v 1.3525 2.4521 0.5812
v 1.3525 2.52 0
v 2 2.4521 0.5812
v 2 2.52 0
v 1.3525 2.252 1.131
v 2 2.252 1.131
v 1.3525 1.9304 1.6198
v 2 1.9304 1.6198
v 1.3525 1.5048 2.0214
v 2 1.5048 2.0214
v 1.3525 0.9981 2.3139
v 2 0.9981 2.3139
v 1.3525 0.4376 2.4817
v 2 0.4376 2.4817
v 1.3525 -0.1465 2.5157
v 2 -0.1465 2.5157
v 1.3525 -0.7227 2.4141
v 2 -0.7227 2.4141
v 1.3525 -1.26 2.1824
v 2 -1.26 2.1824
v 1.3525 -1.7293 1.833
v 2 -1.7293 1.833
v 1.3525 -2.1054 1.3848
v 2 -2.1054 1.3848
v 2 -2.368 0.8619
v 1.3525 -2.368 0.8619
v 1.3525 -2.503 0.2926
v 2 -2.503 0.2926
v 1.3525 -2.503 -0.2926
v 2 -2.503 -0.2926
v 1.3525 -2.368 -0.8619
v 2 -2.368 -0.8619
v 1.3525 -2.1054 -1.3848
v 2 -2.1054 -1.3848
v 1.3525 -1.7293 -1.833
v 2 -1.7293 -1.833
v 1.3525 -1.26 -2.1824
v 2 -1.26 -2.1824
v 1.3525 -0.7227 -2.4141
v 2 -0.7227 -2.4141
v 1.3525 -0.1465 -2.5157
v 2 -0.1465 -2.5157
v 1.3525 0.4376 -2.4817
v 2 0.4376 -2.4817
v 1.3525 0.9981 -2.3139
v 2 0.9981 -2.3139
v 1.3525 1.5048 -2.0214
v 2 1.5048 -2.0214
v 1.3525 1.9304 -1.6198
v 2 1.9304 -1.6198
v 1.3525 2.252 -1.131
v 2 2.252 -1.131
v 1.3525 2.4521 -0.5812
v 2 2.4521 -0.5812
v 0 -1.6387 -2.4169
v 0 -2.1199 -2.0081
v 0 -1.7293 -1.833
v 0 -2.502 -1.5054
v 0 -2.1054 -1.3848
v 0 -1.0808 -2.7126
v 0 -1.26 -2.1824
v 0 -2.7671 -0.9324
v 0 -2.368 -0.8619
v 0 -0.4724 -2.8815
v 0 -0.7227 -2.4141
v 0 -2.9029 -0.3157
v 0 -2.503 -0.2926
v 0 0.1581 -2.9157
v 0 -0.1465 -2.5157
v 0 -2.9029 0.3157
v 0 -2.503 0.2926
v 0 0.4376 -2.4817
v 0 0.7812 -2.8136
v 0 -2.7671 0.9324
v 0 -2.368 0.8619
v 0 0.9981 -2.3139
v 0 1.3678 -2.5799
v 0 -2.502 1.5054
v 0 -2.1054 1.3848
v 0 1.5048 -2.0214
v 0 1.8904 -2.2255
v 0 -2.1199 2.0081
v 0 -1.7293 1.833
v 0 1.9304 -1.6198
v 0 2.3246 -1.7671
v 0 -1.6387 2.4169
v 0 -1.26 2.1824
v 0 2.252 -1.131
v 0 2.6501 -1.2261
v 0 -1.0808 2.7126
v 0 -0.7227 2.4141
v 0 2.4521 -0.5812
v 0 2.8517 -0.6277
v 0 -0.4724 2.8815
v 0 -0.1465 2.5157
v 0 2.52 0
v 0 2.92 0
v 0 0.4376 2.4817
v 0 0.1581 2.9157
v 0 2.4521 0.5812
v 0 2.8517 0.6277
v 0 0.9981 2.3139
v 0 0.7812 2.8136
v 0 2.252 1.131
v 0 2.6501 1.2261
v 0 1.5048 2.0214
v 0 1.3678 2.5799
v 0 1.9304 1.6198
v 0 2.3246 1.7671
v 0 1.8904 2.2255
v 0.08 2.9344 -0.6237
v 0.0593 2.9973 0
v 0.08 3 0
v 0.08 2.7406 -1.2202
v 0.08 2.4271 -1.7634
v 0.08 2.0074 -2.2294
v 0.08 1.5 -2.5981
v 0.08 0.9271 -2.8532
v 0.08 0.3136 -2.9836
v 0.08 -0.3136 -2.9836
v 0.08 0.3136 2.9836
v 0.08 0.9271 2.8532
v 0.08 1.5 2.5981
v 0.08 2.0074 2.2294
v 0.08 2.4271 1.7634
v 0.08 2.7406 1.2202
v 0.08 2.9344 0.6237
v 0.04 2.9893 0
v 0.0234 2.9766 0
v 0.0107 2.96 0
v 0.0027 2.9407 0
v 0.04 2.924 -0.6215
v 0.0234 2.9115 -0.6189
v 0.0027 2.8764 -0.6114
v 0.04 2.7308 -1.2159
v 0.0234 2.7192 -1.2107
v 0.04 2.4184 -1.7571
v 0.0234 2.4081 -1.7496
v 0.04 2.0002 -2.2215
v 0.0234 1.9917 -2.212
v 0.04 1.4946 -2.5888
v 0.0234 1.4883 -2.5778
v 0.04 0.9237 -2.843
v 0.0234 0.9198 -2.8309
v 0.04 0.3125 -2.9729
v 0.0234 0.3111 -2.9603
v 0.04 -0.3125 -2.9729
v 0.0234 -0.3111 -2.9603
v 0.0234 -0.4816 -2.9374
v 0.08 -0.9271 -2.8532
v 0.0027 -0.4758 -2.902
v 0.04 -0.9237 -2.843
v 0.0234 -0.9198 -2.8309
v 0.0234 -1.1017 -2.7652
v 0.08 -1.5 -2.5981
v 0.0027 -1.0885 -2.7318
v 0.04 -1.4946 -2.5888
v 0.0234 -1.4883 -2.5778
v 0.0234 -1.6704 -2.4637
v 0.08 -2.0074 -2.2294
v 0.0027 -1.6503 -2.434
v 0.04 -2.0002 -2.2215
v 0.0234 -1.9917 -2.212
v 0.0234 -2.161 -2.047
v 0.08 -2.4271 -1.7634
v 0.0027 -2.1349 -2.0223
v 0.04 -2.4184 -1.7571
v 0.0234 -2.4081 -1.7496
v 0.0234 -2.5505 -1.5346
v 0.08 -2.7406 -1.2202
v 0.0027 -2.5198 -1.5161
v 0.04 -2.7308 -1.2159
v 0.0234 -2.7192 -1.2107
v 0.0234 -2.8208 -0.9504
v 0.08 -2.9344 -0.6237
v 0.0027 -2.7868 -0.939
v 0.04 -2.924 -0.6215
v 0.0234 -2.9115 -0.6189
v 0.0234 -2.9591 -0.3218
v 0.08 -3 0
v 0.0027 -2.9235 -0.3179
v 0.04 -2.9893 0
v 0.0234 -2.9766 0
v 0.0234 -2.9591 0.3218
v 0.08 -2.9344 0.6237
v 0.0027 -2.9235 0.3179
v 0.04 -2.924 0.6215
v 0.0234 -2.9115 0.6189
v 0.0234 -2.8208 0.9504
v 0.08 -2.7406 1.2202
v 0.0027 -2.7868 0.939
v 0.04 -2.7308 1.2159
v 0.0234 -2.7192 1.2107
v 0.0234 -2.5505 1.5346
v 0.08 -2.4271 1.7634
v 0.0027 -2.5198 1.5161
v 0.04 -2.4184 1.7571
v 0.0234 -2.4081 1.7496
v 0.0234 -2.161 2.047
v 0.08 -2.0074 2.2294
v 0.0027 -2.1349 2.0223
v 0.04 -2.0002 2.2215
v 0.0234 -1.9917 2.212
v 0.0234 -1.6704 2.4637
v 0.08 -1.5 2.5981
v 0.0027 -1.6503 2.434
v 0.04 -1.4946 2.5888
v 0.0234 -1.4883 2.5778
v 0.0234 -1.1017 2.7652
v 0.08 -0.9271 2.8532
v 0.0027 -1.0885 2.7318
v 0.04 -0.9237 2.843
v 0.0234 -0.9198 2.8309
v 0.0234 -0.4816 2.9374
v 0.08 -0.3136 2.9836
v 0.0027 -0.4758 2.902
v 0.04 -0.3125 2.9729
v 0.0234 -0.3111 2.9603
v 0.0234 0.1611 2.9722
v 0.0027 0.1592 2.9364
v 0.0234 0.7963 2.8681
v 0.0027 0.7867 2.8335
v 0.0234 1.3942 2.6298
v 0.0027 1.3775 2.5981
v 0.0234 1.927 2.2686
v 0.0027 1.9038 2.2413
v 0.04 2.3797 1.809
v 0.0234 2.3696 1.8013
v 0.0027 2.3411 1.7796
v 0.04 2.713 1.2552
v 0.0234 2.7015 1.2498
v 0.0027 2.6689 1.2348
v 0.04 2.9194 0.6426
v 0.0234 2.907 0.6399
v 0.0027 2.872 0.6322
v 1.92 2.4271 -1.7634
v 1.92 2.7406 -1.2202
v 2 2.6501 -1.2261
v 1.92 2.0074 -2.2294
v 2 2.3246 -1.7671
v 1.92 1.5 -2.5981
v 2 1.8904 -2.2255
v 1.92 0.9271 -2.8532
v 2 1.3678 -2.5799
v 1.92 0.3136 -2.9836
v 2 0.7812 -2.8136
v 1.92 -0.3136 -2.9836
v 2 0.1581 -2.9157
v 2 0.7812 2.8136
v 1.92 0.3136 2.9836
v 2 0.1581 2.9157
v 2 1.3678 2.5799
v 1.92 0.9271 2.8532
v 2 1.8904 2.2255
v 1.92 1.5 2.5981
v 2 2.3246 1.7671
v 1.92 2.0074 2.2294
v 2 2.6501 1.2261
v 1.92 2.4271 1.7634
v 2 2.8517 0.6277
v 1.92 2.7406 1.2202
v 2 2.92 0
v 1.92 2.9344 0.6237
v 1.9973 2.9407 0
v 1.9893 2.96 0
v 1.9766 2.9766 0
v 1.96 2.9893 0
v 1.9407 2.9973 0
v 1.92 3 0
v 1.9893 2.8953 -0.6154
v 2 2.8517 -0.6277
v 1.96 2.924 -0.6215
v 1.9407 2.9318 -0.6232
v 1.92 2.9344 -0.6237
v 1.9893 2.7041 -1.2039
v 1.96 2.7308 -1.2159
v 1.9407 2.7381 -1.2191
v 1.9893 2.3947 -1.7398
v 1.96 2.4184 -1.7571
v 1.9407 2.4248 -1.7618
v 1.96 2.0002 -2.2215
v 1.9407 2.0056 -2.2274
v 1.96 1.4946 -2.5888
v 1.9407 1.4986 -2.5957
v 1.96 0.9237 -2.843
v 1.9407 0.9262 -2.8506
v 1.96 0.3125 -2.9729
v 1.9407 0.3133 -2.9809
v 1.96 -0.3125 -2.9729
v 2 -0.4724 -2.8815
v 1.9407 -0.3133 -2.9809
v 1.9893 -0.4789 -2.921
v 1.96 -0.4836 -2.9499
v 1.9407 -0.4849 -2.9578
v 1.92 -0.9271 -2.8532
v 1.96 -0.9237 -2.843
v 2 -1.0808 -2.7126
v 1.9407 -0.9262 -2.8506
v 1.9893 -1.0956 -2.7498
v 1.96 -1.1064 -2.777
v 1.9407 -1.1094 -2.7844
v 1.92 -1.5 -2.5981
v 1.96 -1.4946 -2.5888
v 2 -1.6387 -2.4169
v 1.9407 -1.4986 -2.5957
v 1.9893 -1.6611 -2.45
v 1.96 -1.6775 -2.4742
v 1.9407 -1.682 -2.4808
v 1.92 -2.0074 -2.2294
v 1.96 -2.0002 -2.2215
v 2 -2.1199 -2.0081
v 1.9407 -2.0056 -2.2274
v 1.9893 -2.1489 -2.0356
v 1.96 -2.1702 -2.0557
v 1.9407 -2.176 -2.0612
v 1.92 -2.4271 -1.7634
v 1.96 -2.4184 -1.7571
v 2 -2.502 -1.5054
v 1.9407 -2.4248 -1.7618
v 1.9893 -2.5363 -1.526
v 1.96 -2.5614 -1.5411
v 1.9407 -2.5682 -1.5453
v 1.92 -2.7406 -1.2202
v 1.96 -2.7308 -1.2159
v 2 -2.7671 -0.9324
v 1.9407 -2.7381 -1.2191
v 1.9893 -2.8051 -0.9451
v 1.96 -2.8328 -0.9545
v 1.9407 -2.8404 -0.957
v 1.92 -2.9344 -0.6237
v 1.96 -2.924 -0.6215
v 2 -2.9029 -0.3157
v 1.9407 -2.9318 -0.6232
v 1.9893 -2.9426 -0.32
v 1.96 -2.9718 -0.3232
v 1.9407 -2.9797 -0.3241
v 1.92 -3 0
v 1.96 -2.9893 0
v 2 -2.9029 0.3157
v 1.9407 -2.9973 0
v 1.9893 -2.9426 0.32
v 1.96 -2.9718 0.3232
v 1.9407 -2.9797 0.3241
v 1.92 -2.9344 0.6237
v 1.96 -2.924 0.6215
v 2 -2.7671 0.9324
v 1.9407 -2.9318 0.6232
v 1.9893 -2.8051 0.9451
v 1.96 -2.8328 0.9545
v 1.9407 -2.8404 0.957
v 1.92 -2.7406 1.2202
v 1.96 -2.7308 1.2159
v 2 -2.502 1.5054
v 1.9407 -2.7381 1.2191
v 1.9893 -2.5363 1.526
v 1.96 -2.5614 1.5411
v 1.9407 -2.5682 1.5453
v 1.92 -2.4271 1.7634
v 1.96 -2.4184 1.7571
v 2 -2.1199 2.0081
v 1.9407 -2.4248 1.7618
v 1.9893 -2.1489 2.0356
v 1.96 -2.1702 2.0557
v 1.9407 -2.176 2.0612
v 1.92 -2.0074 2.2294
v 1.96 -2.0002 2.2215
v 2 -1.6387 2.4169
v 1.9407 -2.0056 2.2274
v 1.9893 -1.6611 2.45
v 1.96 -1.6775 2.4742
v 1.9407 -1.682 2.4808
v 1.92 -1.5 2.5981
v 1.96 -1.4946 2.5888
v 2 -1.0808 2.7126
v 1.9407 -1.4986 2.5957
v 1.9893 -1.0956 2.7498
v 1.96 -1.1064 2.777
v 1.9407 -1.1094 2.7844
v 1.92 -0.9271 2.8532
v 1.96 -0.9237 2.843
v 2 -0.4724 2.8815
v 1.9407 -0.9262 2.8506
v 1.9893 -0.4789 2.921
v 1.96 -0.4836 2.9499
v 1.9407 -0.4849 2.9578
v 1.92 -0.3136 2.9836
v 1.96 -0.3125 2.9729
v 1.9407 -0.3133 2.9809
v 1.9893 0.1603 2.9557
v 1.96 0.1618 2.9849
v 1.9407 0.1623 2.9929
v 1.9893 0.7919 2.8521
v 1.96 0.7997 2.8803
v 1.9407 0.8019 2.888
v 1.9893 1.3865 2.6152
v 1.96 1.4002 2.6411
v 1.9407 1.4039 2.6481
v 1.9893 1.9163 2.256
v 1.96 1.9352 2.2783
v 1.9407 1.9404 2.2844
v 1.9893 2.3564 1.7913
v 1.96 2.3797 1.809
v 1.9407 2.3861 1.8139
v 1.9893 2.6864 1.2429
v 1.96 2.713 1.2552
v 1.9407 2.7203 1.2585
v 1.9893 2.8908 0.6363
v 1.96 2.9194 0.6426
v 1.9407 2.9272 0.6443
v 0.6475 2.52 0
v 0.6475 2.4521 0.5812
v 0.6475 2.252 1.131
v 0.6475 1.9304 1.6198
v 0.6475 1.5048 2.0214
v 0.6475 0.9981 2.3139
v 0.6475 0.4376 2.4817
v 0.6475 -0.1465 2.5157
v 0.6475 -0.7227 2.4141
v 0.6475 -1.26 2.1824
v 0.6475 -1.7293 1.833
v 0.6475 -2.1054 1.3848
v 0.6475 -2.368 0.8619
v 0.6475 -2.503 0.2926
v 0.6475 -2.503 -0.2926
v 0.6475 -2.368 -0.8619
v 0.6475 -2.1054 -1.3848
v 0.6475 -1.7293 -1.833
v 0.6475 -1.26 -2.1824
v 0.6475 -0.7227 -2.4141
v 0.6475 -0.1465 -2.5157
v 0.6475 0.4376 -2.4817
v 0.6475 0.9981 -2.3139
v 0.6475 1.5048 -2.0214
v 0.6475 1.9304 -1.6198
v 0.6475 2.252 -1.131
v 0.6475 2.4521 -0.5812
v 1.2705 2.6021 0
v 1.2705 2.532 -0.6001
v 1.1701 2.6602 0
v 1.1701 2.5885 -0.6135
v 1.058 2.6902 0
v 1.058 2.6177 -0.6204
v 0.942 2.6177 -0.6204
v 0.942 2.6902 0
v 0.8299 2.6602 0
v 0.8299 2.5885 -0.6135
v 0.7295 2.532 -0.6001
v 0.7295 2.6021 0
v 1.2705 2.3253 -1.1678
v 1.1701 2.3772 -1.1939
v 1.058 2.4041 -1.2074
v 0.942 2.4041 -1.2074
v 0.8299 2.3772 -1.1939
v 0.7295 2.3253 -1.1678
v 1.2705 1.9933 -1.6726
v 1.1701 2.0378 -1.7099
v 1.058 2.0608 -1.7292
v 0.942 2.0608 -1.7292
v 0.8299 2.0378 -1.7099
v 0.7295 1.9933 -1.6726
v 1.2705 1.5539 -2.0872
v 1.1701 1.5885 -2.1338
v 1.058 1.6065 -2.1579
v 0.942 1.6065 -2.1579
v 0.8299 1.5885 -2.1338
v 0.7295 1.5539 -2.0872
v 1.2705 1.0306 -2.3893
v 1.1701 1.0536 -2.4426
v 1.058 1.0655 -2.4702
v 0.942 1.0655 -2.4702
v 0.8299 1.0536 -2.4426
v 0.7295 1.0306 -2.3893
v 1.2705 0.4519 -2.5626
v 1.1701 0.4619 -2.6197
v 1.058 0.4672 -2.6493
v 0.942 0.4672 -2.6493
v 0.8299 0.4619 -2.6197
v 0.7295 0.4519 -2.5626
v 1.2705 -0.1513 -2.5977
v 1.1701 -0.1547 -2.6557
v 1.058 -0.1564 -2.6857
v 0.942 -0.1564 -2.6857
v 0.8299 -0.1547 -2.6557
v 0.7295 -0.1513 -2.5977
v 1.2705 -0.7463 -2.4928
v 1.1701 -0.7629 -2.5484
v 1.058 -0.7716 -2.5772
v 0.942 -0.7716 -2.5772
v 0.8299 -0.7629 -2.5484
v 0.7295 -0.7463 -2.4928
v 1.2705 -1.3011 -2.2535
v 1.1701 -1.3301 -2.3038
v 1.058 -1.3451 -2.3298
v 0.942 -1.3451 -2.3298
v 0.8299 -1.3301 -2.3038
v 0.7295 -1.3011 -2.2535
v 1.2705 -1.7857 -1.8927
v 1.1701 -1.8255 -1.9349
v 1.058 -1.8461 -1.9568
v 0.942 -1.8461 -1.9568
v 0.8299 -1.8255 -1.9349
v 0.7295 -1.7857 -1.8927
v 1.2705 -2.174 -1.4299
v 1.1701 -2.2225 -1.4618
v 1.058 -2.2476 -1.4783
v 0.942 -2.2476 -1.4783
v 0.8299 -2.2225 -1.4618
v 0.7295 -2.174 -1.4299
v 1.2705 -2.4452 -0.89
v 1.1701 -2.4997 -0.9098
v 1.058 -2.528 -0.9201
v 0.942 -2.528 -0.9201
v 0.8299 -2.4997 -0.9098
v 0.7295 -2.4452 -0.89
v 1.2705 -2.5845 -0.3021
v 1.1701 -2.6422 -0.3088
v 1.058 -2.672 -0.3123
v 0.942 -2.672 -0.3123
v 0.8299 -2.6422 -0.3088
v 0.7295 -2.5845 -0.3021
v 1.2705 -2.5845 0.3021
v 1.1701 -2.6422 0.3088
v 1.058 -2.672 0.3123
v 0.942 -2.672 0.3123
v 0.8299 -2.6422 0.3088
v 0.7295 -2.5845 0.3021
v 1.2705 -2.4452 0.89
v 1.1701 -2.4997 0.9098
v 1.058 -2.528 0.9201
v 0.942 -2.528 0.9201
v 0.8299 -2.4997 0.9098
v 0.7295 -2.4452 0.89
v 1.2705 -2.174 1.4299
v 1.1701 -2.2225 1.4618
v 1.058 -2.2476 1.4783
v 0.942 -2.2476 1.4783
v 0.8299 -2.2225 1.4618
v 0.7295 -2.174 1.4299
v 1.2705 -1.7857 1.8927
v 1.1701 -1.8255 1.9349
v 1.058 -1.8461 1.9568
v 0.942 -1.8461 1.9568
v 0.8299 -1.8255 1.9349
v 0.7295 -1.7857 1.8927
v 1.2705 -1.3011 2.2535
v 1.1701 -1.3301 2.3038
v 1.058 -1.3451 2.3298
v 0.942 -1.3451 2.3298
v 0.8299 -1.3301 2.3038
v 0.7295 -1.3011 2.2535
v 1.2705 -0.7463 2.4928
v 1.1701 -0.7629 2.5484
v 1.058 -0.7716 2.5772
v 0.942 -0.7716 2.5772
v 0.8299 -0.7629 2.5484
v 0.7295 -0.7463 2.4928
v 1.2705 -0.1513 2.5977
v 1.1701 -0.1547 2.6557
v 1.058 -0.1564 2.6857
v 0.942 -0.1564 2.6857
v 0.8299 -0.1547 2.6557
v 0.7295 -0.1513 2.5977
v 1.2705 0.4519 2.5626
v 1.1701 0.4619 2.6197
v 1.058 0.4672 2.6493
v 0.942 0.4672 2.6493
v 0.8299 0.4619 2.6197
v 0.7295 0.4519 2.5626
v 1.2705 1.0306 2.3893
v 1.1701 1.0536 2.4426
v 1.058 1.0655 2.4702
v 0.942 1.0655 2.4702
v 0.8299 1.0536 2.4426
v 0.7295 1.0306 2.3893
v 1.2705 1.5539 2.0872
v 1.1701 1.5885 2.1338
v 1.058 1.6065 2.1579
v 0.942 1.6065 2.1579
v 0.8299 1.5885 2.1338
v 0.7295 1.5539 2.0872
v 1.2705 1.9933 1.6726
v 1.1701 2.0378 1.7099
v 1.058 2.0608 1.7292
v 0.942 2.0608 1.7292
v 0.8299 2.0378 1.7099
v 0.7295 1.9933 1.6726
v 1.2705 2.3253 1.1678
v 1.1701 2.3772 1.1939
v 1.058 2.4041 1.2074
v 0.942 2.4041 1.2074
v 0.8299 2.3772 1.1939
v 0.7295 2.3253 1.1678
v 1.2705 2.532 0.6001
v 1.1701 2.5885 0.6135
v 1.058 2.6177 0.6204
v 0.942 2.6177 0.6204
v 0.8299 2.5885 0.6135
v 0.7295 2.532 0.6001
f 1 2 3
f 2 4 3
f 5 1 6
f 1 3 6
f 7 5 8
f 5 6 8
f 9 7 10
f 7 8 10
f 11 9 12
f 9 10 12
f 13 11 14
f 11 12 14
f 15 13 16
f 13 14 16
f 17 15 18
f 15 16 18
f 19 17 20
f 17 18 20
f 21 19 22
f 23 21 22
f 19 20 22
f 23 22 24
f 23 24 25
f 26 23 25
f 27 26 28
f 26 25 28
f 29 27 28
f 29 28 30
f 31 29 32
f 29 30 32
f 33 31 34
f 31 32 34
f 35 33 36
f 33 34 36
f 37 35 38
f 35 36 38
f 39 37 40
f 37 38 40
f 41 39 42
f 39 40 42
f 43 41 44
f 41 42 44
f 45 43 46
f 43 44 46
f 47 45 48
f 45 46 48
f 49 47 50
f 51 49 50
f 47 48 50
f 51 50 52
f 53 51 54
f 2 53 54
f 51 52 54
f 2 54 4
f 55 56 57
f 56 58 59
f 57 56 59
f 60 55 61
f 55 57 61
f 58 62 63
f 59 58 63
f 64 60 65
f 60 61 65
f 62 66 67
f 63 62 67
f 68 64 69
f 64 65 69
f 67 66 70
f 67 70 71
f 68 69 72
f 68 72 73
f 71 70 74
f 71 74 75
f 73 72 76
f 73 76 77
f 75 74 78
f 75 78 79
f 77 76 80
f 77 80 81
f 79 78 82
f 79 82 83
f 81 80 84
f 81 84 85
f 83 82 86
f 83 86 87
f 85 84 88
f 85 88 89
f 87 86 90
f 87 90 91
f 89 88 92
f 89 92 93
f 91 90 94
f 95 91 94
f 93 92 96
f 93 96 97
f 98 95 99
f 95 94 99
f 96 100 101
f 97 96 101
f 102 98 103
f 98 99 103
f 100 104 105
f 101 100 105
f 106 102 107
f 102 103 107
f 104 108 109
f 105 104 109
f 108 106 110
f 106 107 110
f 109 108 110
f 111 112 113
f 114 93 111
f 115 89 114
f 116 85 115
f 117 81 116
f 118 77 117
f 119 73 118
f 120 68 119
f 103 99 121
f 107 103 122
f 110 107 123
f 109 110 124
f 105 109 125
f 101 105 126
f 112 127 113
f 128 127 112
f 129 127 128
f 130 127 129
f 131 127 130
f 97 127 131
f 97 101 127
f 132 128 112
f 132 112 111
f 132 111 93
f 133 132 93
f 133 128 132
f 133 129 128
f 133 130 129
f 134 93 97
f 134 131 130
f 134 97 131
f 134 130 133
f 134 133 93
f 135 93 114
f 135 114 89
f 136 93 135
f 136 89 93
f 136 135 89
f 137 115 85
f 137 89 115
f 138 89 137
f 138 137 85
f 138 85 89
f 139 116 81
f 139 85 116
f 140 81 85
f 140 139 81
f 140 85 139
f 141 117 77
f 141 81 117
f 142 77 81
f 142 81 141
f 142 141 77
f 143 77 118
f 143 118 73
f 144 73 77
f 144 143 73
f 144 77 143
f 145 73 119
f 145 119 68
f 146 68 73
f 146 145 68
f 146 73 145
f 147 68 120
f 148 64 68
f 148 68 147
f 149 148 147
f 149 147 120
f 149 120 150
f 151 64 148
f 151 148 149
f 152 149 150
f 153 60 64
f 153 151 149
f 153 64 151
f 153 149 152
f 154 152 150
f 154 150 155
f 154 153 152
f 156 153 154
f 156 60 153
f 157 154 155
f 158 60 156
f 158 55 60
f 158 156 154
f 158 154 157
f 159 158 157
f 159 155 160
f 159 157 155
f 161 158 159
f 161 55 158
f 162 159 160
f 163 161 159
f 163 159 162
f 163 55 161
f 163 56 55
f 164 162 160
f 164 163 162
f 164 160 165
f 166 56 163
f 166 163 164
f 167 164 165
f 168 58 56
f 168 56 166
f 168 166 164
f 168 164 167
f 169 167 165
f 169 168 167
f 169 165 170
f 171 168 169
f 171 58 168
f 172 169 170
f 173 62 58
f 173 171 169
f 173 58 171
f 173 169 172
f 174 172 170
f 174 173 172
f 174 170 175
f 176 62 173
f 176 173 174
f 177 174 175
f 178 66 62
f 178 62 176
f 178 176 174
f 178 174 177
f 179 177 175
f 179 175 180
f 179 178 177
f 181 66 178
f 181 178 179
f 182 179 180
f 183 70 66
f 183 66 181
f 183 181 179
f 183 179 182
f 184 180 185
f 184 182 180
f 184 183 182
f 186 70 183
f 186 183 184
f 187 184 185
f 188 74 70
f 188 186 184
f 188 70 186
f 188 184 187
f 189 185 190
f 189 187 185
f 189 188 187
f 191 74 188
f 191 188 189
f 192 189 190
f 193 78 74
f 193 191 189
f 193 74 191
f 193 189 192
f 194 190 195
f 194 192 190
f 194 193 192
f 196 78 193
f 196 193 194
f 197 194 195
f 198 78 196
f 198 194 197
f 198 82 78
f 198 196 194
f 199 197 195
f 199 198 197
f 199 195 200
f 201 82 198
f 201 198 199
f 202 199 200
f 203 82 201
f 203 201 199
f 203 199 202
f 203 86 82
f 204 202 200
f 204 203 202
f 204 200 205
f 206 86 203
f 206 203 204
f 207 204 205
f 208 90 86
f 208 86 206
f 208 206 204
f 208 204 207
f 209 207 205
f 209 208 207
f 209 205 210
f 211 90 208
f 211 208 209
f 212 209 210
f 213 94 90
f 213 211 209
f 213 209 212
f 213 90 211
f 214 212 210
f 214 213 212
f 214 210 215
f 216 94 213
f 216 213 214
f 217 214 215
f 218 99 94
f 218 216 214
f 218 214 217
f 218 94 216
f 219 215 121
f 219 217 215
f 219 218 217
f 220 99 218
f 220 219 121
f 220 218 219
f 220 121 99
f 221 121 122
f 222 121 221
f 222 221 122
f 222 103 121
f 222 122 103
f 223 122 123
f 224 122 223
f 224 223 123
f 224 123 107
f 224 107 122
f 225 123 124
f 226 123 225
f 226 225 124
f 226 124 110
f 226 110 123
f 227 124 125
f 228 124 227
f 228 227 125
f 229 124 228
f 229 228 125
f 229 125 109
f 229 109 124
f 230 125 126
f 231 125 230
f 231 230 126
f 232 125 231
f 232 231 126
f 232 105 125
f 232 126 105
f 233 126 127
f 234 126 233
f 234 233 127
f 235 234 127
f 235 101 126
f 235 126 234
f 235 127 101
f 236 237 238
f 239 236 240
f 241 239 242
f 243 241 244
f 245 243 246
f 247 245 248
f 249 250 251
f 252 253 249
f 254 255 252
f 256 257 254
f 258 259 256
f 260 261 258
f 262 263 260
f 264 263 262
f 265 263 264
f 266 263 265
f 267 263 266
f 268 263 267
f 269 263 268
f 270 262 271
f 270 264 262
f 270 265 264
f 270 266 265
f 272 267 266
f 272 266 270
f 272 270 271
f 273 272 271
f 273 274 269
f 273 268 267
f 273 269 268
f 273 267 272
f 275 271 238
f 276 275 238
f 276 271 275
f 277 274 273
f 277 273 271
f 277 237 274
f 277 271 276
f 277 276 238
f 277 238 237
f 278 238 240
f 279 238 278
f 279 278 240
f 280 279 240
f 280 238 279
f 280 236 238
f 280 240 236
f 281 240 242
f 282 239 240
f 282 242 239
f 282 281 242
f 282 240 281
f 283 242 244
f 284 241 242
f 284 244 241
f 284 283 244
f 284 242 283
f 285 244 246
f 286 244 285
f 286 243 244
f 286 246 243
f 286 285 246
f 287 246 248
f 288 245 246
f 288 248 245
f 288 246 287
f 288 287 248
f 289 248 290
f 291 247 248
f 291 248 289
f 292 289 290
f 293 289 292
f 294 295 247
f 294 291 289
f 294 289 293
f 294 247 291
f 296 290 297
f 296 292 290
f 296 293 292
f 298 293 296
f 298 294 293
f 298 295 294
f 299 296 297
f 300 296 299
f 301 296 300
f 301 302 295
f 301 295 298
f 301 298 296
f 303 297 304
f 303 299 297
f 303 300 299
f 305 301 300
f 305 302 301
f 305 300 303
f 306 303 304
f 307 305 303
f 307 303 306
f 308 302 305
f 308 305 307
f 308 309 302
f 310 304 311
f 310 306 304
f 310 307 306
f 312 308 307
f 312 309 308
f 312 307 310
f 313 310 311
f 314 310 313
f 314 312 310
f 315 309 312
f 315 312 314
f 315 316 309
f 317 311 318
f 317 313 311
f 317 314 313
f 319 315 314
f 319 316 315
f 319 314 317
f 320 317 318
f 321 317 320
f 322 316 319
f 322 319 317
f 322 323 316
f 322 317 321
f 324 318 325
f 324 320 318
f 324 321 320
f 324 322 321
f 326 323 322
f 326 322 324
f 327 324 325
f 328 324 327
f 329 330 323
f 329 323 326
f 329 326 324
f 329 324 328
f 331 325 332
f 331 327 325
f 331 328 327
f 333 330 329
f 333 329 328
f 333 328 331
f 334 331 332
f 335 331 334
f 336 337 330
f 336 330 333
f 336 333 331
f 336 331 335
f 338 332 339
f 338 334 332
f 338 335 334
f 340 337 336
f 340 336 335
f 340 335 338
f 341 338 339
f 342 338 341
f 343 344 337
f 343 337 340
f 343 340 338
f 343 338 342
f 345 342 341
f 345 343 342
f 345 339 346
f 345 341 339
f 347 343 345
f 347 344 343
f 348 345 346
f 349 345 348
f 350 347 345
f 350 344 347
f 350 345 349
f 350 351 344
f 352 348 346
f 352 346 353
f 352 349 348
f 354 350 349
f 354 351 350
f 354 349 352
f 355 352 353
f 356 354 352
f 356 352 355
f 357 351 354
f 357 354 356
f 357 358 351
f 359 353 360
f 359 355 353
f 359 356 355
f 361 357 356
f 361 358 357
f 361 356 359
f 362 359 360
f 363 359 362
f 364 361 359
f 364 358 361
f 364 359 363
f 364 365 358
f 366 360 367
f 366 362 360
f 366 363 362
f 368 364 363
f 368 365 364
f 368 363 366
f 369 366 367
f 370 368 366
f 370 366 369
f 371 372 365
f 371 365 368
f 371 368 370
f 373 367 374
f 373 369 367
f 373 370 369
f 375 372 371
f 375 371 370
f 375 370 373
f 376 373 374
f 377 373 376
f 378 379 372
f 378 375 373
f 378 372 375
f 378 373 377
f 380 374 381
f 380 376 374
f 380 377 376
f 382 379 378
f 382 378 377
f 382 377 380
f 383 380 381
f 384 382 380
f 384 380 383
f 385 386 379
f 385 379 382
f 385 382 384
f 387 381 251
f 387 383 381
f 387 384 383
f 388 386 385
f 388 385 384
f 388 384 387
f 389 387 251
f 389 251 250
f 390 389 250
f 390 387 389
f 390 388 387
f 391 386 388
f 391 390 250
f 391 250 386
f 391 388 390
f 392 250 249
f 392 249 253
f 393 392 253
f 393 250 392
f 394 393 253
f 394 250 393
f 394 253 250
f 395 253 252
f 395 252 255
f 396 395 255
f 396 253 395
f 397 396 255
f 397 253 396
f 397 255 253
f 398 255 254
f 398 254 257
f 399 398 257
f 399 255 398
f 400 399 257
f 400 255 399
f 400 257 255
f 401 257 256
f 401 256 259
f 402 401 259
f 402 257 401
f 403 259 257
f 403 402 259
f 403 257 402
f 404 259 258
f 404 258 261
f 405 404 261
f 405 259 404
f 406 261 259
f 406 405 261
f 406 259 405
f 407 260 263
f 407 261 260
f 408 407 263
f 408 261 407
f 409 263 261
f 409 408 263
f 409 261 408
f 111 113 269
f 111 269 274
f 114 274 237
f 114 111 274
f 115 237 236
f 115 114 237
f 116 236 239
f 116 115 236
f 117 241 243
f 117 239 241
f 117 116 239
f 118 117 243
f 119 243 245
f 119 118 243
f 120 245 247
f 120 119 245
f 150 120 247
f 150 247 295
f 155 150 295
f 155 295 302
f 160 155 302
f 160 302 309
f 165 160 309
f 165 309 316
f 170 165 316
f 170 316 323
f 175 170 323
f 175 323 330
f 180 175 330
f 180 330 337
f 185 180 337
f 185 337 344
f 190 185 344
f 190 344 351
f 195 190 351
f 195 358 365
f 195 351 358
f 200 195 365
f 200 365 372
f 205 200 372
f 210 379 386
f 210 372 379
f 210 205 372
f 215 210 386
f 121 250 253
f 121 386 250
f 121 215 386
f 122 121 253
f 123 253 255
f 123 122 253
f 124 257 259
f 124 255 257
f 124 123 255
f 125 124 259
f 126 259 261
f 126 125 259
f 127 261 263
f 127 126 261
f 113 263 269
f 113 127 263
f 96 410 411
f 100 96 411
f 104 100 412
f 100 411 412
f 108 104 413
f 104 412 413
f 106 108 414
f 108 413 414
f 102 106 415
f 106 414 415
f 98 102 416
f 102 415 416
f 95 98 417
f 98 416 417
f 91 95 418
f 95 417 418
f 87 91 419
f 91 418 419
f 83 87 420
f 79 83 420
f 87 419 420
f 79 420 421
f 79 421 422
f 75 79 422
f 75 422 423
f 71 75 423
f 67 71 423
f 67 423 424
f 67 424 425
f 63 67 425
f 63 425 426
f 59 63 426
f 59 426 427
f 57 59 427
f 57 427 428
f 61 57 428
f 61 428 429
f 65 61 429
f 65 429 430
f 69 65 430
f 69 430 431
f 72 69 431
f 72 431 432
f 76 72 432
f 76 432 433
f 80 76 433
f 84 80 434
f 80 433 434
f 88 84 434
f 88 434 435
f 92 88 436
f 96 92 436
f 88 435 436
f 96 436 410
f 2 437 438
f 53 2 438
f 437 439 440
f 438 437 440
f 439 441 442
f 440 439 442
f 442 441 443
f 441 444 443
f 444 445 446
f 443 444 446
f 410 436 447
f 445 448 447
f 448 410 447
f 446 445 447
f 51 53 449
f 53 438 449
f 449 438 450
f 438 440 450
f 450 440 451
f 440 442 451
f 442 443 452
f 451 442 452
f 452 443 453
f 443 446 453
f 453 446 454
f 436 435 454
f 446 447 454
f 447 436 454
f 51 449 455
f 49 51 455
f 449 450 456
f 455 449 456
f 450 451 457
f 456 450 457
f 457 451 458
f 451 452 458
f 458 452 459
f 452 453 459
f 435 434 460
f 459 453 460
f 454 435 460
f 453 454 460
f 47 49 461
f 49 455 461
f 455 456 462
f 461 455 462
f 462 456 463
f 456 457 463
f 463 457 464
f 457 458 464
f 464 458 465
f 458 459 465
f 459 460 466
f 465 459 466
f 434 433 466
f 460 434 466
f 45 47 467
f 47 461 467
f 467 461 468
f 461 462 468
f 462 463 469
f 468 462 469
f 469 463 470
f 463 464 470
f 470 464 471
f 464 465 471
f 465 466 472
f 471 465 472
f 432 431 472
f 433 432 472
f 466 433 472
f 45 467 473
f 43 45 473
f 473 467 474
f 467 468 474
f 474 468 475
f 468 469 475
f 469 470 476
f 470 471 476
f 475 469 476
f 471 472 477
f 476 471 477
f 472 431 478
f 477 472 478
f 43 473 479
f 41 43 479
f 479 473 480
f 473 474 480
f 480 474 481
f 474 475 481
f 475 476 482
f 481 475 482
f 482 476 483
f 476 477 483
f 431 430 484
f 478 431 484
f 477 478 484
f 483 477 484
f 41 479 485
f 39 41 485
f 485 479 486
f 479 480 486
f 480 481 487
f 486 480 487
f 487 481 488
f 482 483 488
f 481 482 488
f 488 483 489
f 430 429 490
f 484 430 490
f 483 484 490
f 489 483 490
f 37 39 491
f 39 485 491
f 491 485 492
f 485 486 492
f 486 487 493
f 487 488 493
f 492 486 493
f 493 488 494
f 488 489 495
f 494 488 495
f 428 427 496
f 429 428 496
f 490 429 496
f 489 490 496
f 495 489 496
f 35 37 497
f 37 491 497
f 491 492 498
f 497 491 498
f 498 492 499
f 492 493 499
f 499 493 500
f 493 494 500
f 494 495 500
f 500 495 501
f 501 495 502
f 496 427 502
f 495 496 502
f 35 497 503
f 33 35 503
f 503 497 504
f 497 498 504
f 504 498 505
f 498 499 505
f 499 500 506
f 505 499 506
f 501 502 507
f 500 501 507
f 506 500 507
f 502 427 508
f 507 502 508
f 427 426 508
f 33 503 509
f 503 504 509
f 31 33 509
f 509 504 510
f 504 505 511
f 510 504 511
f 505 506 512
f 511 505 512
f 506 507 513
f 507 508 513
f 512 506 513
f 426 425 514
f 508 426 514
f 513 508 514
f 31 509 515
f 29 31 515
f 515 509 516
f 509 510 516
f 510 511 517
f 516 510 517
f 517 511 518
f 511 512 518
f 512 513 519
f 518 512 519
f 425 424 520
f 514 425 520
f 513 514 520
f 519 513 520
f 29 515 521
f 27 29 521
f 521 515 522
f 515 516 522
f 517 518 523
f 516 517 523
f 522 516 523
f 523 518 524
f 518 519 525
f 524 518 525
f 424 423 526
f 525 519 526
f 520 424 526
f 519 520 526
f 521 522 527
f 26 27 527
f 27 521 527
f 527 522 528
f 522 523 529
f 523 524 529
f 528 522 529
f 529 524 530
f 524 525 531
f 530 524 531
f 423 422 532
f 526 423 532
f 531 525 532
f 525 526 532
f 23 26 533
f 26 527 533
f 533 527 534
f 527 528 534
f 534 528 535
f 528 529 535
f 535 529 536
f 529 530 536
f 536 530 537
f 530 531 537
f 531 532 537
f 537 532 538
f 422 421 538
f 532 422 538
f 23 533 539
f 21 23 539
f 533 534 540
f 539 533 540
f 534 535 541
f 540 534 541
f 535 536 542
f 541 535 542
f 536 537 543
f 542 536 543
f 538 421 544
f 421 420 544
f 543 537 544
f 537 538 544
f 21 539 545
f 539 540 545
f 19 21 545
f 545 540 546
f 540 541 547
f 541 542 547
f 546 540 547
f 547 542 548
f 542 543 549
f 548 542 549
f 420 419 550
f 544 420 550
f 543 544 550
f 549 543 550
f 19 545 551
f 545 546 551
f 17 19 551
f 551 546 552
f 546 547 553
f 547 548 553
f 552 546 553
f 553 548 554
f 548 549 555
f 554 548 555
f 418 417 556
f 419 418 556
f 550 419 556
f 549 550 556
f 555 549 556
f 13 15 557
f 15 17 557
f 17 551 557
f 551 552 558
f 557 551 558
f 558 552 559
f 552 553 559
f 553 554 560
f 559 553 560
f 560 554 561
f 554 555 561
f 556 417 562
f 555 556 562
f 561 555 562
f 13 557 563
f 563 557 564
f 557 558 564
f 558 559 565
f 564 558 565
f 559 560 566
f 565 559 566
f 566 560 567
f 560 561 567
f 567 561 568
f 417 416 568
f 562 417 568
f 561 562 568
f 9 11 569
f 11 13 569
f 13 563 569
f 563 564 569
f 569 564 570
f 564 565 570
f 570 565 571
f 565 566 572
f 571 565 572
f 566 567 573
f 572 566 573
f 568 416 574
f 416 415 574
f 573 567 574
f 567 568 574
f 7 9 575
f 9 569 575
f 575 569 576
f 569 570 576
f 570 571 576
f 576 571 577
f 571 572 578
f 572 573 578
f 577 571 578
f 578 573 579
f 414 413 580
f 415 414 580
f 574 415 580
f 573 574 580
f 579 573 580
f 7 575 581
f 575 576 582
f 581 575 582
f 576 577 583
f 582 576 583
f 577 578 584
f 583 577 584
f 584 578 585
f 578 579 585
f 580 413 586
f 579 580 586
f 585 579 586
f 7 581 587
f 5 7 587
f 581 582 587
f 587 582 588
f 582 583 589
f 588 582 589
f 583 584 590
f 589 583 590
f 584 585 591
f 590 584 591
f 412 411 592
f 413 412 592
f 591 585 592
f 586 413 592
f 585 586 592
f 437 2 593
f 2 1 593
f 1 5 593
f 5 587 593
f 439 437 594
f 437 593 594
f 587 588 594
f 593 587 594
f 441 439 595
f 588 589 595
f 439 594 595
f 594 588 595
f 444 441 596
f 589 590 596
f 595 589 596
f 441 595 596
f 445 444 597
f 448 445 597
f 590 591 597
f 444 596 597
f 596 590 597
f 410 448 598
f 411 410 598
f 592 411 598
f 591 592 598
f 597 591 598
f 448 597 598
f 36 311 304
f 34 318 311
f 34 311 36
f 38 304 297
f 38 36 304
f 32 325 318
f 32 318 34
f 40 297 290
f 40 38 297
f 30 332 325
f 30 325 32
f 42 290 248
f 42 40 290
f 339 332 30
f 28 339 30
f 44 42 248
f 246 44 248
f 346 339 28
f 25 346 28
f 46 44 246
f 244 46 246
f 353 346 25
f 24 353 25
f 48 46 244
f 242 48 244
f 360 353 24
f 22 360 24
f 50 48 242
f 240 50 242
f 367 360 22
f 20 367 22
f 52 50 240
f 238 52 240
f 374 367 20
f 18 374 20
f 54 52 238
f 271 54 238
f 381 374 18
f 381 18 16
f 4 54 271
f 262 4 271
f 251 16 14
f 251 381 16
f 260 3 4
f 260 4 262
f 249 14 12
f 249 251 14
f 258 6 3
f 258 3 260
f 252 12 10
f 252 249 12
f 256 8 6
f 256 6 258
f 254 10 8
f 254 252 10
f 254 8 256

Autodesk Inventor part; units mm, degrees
sketch "Sketch_1" plane through (0, 0, 0) normal (0, 0, 1) x (1, 0, 0)
  line L0 (2, 0) -> (0, 0)
  line L1 (0, 2.92) -> (0, 2.52)
  line L2 (0, 2.52) -> (0.6475, 2.52)
  arc A0 (1.3525, 2.52) -> (0.6475, 2.52) centre (1, 2.25) ccw
  line L3 (1.3525, 2.52) -> (2, 2.52)
  line L4 (2, 2.52) -> (2, 2.92)
  arc A1 (2, 2.92) -> (1.92, 3) centre (1.92, 2.92) ccw
  line L5 (1.92, 3) -> (0.08, 3)
  arc A2 (0.08, 3) -> (0, 2.92) centre (0.08, 2.92) ccw
revolve "Revolution1" add sketch "Sketch_1" angle 360 about axis through (2, 0, 0) along (1, 0, 0)
ref_plane "mss_or_XY" through (0, 0, 0) normal (1, 0, 0) x (0, 0, -1)
ref_plane "mss_or_YZ" through (0, 0, 0) normal (0, 0, -1) x (0, 1, 0)
ref_plane "mss_or_ZX" through (0, 0, 0) normal (0, 1, 0) x (1, 0, 0)
ref_plane "mss_or11_XY" through (2.5, 0, 0) normal (1, 0, 0) x (0, 0, -1)
ref_plane "mss_or11_YZ" through (2.5, 0, 0) normal (0, 0, -1) x (0, 1, 0)
ref_plane "mss_or11_ZX" through (2.5, 0, 0) normal (0, 1, 0) x (1, 0, 0)
ref_plane "mss_or2_1_XY" through (1, 2.25, 0) normal (1, 0, 0) x (0, 0, -1)
ref_plane "mss_or2_1_YZ" through (1, 2.25, 0) normal (0, 0, -1) x (0, 1, 0)
ref_plane "mss_or2_1_ZX" through (1, 2.25, 0) normal (0, 1, 0) x (1, 0, 0)
ref_plane "mss_or2_2_XY" through (1, 1.7236, 1.4463) normal (1, 0, 0) x (0, 0, -1)
ref_plane "mss_or2_2_YZ" through (1, 1.7236, 1.4463) normal (0, 0, -1) x (0, 1, 0)
ref_plane "mss_or2_2_ZX" through (1, 1.7236, 1.4463) normal (0, 1, 0) x (1, 0, 0)
ref_plane "mss_or2_3_XY" through (1, 0.3907, 2.2158) normal (1, 0, 0) x (0, 0, -1)
ref_plane "mss_or2_3_YZ" through (1, 0.3907, 2.2158) normal (0, 0, -1) x (0, 1, 0)
ref_plane "mss_or2_3_ZX" through (1, 0.3907, 2.2158) normal (0, 1, 0) x (1, 0, 0)
ref_plane "mss_or2_4_XY" through (1, -1.125, 1.9486) normal (1, 0, 0) x (0, 0, -1)
ref_plane "mss_or2_4_YZ" through (1, -1.125, 1.9486) normal (0, 0, -1) x (0, 1, 0)
ref_plane "mss_or2_4_ZX" through (1, -1.125, 1.9486) normal (0, 1, 0) x (1, 0, 0)
ref_plane "mss_or2_5_XY" through (1, -2.1143, 0.7695) normal (1, 0, 0) x (0, 0, -1)
ref_plane "mss_or2_5_YZ" through (1, -2.1143, 0.7695) normal (0, 0, -1) x (0, 1, 0)
ref_plane "mss_or2_5_ZX" through (1, -2.1143, 0.7695) normal (0, 1, 0) x (1, 0, 0)
ref_plane "mss_or2_6_XY" through (1, -2.1143, -0.7695) normal (1, 0, 0) x (0, 0, -1)
ref_plane "mss_or2_6_YZ" through (1, -2.1143, -0.7695) normal (0, 0, -1) x (0, 1, 0)
ref_plane "mss_or2_6_ZX" through (1, -2.1143, -0.7695) normal (0, 1, 0) x (1, 0, 0)
ref_plane "mss_or2_7_XY" through (1, -1.125, -1.9486) normal (1, 0, 0) x (0, 0, -1)
ref_plane "mss_or2_7_YZ" through (1, -1.125, -1.9486) normal (0, 0, -1) x (0, 1, 0)
ref_plane "mss_or2_7_ZX" through (1, -1.125, -1.9486) normal (0, 1, 0) x (1, 0, 0)
ref_plane "mss_or2_8_XY" through (1, 0.3907, -2.2158) normal (1, 0, 0) x (0, 0, -1)
ref_plane "mss_or2_8_YZ" through (1, 0.3907, -2.2158) normal (0, 0, -1) x (0, 1, 0)
ref_plane "mss_or2_8_ZX" through (1, 0.3907, -2.2158) normal (0, 1, 0) x (1, 0, 0)
ref_plane "mss_or2_9_XY" through (1, 1.7236, -1.4463) normal (1, 0, 0) x (0, 0, -1)
ref_plane "mss_or2_9_YZ" through (1, 1.7236, -1.4463) normal (0, 0, -1) x (0, 1, 0)
ref_plane "mss_or2_9_ZX" through (1, 1.7236, -1.4463) normal (0, 1, 0) x (1, 0, 0)
ref_plane "mss_or21_1_XY" through (1.25, 2.25, 0) normal (1, 0, 0) x (0, 0, -1)
ref_plane "mss_or21_1_YZ" through (1.25, 2.25, 0) normal (0, 0, -1) x (0, 1, 0)
ref_plane "mss_or21_1_ZX" through (1.25, 2.25, 0) normal (0, 1, 0) x (1, 0, 0)
ref_plane "mss_or21_2_XY" through (1.25, 1.7236, 1.4463) normal (1, 0, 0) x (0, 0, -1)
ref_plane "mss_or21_2_YZ" through (1.25, 1.7236, 1.4463) normal (0, 0, -1) x (0, 1, 0)
ref_plane "mss_or21_2_ZX" through (1.25, 1.7236, 1.4463) normal (0, 1, 0) x (1, 0, 0)
ref_plane "mss_or21_3_XY" through (1.25, 0.3907, 2.2158) normal (1, 0, 0) x (0, 0, -1)
ref_plane "mss_or21_3_YZ" through (1.25, 0.3907, 2.2158) normal (0, 0, -1) x (0, 1, 0)
ref_plane "mss_or21_3_ZX" through (1.25, 0.3907, 2.2158) normal (0, 1, 0) x (1, 0, 0)
ref_plane "mss_or21_4_XY" through (1.25, -1.125, 1.9486) normal (1, 0, 0) x (0, 0, -1)
ref_plane "mss_or21_4_YZ" through (1.25, -1.125, 1.9486) normal (0, 0, -1) x (0, 1, 0)
ref_plane "mss_or21_4_ZX" through (1.25, -1.125, 1.9486) normal (0, 1, 0) x (1, 0, 0)
ref_plane "mss_or21_5_XY" through (1.25, -2.1143, 0.7695) normal (1, 0, 0) x (0, 0, -1)
ref_plane "mss_or21_5_YZ" through (1.25, -2.1143, 0.7695) normal (0, 0, -1) x (0, 1, 0)
ref_plane "mss_or21_5_ZX" through (1.25, -2.1143, 0.7695) normal (0, 1, 0) x (1, 0, 0)
ref_plane "mss_or21_6_XY" through (1.25, -2.1143, -0.7695) normal (1, 0, 0) x (0, 0, -1)
ref_plane "mss_or21_6_YZ" through (1.25, -2.1143, -0.7695) normal (0, 0, -1) x (0, 1, 0)
ref_plane "mss_or21_6_ZX" through (1.25, -2.1143, -0.7695) normal (0, 1, 0) x (1, 0, 0)
ref_plane "mss_or21_7_XY" through (1.25, -1.125, -1.9486) normal (1, 0, 0) x (0, 0, -1)
ref_plane "mss_or21_7_YZ" through (1.25, -1.125, -1.9486) normal (0, 0, -1) x (0, 1, 0)
ref_plane "mss_or21_7_ZX" through (1.25, -1.125, -1.9486) normal (0, 1, 0) x (1, 0, 0)
ref_plane "mss_or21_8_XY" through (1.25, 0.3907, -2.2158) normal (1, 0, 0) x (0, 0, -1)
ref_plane "mss_or21_8_YZ" through (1.25, 0.3907, -2.2158) normal (0, 0, -1) x (0, 1, 0)
ref_plane "mss_or21_8_ZX" through (1.25, 0.3907, -2.2158) normal (0, 1, 0) x (1, 0, 0)
ref_plane "mss_or21_9_XY" through (1.25, 1.7236, -1.4463) normal (1, 0, 0) x (0, 0, -1)
ref_plane "mss_or21_9_YZ" through (1.25, 1.7236, -1.4463) normal (0, 0, -1) x (0, 1, 0)
ref_plane "mss_or21_9_ZX" through (1.25, 1.7236, -1.4463) normal (0, 1, 0) x (1, 0, 0)
properties part number "673 Outer ring"
